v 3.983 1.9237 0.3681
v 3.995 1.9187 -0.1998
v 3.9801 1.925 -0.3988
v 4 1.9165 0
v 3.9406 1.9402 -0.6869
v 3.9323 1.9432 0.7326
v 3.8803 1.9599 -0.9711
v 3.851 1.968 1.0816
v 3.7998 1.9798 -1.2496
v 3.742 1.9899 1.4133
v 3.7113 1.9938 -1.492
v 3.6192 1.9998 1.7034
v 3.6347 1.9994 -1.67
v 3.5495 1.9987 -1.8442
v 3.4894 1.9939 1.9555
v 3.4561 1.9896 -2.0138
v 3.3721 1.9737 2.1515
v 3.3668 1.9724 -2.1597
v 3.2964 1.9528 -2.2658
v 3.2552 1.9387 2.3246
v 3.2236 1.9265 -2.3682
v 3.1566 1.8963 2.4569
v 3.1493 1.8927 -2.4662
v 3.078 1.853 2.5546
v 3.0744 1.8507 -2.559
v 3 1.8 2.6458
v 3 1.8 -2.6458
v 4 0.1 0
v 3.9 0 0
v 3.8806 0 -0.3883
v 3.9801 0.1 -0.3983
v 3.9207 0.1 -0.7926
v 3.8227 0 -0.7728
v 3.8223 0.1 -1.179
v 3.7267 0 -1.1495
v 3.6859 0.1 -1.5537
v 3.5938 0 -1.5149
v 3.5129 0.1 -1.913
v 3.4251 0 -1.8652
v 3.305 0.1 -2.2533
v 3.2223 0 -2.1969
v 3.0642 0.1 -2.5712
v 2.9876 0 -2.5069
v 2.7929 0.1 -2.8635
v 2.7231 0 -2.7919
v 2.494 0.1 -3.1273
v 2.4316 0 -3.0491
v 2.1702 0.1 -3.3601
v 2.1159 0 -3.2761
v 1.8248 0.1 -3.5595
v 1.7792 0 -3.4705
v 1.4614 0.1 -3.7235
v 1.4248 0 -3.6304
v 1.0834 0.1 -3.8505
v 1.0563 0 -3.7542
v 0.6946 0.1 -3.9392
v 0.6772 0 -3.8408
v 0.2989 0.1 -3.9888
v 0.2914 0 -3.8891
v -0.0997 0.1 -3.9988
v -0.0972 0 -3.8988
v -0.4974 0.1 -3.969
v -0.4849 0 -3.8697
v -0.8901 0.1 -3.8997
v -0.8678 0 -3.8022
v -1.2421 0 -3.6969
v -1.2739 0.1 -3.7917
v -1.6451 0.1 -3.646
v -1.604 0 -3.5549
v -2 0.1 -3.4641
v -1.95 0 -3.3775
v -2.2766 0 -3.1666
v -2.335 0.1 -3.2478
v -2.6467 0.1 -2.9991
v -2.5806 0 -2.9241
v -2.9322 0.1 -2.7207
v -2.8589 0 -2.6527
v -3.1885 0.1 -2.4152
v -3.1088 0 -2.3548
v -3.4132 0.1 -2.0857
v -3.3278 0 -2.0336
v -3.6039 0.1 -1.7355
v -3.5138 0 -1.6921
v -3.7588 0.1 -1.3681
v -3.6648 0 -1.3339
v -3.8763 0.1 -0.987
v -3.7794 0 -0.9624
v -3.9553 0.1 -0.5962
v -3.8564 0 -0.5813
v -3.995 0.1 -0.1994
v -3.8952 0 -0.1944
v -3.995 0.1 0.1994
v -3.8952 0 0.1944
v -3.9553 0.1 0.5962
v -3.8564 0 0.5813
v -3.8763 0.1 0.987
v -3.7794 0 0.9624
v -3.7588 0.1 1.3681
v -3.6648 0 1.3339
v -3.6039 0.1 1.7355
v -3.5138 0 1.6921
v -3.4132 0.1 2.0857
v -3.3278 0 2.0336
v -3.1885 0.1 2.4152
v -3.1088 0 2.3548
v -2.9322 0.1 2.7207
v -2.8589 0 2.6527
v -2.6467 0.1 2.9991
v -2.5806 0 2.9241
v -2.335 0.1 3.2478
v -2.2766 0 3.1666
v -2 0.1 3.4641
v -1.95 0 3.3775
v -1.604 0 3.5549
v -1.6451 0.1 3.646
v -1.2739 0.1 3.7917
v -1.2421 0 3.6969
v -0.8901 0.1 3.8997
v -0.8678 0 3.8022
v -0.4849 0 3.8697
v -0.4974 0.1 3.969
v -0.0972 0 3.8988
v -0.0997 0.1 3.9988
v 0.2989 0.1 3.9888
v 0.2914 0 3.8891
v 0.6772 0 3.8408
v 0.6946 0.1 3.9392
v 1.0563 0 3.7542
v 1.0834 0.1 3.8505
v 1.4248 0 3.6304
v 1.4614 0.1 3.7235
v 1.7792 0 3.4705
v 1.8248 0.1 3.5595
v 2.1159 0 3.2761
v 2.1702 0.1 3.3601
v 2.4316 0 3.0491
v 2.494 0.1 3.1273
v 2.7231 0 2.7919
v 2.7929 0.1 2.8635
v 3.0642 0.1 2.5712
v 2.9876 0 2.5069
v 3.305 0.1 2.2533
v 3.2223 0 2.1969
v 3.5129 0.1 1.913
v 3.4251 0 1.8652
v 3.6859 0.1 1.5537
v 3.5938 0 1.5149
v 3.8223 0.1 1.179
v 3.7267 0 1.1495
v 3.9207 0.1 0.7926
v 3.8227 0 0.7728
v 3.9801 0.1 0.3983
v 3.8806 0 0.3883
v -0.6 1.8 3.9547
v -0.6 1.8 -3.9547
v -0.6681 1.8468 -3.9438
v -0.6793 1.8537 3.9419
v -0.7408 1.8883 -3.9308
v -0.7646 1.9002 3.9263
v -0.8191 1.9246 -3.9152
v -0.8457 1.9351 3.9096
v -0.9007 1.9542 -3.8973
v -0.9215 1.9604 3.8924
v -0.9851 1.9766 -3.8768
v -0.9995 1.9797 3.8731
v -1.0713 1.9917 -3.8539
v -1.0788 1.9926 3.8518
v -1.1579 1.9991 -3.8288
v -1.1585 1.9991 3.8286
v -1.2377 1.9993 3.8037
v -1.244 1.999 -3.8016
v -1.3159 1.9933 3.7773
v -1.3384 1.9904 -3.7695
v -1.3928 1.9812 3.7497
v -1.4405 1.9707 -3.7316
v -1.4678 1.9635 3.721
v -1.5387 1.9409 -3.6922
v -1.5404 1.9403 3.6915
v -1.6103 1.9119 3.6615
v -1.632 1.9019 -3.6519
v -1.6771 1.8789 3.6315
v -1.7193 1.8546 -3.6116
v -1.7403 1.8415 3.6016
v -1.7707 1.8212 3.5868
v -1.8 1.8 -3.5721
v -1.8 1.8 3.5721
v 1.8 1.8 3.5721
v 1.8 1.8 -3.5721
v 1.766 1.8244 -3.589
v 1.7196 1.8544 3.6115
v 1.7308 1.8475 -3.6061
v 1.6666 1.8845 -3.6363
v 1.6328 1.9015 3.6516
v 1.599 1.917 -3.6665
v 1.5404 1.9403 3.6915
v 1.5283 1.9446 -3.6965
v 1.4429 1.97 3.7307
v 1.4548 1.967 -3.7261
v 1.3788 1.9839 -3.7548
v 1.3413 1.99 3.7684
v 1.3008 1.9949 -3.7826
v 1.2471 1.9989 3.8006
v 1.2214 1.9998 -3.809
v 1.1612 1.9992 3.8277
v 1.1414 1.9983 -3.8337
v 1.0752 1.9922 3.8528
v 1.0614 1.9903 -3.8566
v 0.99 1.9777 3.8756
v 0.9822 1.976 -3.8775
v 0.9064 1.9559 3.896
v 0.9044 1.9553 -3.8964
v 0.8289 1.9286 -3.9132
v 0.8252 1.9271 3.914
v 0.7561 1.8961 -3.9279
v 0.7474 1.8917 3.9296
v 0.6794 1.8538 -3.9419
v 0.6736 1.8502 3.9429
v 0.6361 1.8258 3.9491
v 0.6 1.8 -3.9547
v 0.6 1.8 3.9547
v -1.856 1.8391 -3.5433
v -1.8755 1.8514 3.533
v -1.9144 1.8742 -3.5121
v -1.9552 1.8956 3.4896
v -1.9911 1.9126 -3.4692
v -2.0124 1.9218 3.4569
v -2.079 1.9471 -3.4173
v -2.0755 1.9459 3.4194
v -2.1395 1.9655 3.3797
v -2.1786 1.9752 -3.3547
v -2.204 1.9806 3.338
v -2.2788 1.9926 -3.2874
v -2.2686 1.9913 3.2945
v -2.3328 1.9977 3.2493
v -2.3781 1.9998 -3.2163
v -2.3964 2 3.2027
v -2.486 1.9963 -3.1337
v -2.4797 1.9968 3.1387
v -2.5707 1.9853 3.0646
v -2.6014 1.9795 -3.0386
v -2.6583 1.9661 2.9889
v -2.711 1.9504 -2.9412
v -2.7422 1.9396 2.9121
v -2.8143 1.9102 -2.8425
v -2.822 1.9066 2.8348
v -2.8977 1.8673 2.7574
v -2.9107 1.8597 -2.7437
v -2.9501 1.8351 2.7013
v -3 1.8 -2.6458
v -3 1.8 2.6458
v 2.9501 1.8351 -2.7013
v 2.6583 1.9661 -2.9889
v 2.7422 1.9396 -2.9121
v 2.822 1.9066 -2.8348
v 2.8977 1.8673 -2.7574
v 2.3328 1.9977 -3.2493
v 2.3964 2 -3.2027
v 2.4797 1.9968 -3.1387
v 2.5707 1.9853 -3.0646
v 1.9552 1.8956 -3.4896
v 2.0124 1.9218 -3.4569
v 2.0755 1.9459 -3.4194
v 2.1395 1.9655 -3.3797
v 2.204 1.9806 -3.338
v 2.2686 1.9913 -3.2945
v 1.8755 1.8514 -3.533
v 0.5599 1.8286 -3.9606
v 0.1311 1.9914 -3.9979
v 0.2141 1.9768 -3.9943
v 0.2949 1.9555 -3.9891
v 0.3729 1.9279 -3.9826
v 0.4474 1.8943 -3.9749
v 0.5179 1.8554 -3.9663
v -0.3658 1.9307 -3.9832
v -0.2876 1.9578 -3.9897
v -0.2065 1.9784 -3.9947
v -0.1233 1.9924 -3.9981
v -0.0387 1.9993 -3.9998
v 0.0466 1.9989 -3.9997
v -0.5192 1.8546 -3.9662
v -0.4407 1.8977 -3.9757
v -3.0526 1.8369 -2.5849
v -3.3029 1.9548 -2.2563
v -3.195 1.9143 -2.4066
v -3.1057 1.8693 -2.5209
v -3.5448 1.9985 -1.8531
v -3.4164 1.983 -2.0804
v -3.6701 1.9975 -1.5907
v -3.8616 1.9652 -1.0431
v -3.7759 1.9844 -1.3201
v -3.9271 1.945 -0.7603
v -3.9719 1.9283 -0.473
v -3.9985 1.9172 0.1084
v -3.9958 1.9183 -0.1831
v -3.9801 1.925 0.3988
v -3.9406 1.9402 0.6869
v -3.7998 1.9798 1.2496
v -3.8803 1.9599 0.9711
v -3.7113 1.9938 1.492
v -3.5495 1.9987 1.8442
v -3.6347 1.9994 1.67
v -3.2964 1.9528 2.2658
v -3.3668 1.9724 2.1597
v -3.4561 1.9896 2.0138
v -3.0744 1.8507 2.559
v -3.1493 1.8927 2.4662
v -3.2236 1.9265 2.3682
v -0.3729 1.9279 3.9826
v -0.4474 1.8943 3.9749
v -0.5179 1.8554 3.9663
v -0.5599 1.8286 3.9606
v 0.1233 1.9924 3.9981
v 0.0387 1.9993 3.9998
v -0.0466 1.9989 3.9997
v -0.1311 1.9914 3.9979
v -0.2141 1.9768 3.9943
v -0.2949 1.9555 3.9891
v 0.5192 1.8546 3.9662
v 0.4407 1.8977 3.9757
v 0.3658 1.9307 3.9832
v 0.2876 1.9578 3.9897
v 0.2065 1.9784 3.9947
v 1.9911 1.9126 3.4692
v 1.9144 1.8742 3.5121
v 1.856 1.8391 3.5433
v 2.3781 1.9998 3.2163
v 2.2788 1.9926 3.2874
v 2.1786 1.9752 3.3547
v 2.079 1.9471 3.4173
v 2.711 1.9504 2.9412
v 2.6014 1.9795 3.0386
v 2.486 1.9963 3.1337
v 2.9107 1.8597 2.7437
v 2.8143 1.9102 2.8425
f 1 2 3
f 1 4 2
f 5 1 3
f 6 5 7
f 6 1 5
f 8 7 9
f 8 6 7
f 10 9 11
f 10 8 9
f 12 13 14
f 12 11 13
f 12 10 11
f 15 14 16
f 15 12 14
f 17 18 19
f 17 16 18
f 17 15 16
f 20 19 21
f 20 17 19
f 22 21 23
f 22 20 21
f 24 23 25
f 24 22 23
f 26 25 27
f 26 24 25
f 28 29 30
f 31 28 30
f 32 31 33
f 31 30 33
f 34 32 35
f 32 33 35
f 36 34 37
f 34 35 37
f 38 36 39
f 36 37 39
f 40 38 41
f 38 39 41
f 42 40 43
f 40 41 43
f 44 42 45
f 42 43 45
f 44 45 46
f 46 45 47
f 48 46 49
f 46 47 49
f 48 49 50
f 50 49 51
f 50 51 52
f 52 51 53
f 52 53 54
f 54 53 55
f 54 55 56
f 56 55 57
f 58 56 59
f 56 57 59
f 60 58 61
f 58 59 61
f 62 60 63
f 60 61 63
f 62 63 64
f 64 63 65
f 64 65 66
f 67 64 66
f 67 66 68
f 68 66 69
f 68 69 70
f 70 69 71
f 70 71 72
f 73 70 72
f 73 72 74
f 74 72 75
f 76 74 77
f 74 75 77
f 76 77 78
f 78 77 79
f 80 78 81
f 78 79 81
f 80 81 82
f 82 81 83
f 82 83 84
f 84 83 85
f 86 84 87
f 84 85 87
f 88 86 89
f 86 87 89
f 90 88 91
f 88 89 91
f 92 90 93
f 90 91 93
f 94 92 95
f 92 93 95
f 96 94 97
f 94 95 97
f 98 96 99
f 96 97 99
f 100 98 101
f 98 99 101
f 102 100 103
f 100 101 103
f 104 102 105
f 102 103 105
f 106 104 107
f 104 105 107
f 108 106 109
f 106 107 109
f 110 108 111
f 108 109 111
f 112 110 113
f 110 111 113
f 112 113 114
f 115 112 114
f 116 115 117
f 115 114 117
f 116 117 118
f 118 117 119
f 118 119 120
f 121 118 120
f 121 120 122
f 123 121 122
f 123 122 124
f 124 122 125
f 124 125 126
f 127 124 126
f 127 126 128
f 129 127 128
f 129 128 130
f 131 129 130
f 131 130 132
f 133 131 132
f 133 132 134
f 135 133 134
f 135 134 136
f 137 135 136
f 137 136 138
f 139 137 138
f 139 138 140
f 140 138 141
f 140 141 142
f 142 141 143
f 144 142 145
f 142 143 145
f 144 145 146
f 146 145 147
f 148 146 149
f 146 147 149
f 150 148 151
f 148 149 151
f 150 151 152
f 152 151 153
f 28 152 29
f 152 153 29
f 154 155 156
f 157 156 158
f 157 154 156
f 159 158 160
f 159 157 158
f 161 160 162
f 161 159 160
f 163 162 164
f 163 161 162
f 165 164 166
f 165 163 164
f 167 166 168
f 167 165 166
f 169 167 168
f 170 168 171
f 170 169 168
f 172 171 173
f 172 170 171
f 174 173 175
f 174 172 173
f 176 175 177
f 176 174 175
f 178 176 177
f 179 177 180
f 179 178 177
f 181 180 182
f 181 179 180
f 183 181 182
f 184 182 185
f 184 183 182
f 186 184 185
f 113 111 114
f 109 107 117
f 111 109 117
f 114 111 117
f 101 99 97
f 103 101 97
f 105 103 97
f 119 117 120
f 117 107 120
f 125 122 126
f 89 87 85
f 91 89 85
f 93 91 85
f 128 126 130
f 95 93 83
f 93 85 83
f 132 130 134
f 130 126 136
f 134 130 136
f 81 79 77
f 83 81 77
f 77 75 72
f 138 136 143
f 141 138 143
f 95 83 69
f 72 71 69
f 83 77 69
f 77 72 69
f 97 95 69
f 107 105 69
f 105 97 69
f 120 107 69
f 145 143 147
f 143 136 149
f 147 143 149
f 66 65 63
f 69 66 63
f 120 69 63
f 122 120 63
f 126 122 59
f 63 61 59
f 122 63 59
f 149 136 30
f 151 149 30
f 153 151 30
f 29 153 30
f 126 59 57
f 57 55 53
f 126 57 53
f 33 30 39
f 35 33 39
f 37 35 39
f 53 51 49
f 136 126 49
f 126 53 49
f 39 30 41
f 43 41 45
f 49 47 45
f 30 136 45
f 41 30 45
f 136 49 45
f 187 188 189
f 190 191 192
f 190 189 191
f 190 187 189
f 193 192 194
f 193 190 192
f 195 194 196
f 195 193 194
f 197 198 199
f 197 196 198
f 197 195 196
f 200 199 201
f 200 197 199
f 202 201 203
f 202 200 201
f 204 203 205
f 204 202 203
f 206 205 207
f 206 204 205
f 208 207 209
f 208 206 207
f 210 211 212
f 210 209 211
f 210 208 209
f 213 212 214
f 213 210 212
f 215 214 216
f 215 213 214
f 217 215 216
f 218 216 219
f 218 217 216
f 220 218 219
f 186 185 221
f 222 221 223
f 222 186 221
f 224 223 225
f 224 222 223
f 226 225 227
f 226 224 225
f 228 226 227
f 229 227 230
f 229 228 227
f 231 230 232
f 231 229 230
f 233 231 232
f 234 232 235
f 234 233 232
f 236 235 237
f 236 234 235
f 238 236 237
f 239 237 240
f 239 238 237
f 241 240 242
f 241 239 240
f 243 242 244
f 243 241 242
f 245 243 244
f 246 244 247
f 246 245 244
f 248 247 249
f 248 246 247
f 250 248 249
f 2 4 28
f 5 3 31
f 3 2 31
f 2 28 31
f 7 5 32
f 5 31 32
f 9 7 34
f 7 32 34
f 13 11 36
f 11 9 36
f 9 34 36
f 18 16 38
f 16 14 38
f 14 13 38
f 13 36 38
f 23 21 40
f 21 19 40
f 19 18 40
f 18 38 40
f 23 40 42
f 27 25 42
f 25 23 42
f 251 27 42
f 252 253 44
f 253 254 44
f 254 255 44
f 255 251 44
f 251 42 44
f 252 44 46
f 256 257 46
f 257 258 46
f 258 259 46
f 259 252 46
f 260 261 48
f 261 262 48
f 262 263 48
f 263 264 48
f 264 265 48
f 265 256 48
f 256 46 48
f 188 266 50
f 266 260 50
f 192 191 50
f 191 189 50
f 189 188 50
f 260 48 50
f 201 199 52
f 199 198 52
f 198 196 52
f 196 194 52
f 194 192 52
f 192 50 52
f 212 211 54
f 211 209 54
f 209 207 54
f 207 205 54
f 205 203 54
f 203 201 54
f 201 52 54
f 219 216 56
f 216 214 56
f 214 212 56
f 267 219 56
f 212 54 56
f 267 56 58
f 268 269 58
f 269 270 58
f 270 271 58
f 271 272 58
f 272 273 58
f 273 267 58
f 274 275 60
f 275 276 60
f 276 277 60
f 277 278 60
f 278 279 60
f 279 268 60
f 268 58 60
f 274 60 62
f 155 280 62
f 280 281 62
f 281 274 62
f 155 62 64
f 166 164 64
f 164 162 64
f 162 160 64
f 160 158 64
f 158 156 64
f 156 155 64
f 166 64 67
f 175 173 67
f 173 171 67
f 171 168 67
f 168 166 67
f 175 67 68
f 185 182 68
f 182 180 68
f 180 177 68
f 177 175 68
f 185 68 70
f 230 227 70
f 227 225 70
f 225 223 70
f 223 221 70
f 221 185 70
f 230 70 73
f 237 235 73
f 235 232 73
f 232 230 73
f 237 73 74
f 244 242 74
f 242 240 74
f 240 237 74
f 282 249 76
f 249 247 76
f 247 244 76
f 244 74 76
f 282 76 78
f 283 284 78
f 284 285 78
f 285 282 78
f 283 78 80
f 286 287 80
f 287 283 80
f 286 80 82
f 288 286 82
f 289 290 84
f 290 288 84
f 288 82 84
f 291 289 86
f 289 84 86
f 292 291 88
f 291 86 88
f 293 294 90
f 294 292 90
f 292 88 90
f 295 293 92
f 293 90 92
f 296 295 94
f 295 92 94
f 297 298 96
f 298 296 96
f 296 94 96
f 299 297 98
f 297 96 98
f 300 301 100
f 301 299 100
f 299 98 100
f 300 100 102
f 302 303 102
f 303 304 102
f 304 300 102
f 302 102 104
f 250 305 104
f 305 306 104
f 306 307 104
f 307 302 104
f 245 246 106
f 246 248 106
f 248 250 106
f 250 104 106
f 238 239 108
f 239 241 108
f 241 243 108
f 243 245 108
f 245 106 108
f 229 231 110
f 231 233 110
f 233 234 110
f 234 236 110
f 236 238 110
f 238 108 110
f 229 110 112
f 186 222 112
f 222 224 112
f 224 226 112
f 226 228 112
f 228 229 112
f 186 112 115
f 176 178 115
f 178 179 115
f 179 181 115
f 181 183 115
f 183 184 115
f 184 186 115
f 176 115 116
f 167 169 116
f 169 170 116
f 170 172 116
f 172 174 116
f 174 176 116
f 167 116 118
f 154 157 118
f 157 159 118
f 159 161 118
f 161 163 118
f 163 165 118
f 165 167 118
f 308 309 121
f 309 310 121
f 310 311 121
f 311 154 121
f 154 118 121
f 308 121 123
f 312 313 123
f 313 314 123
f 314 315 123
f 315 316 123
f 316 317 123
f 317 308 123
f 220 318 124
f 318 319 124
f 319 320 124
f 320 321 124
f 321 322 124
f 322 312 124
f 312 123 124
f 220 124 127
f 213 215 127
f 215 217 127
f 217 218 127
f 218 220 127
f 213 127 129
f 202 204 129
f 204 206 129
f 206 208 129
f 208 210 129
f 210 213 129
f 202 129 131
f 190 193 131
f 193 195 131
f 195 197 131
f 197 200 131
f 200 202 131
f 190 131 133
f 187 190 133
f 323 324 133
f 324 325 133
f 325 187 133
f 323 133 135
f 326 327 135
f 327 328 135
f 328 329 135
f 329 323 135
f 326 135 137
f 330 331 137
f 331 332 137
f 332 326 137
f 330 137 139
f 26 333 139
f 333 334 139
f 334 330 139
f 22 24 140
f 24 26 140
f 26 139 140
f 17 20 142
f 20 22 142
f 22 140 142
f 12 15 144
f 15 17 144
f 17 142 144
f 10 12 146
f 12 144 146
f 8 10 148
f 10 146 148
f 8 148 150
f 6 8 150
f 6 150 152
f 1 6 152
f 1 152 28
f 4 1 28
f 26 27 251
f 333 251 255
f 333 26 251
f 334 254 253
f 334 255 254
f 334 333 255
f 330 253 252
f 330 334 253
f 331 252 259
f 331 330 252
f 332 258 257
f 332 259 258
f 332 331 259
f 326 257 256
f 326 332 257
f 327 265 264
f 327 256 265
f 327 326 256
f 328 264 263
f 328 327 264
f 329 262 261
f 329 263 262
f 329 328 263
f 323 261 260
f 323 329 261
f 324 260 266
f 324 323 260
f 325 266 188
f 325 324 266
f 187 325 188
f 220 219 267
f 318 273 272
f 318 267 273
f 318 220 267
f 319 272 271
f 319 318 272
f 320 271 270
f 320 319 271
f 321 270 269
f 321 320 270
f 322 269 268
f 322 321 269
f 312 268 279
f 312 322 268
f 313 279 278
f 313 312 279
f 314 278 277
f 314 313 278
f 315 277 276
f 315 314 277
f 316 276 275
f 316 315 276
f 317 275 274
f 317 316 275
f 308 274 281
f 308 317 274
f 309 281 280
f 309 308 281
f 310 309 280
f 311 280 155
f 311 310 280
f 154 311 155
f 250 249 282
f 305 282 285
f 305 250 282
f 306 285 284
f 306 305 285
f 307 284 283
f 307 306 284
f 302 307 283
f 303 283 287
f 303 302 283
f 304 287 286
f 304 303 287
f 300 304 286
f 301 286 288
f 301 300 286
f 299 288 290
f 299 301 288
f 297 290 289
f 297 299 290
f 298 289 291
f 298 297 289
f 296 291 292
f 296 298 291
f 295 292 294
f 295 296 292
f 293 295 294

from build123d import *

# Parameters (mm, degrees)
SKETCH_1_R          = 4
EXTRUDE_1_DEPTH     = 2
CUT_EXTRUDE_1_DEPTH = 4
CHAMFER_1_SIZE      = 0.1


with BuildPart() as part:
    # 草图1 → 凸台-拉伸1 (new body)
    with BuildSketch(Plane(origin=(0, 0, 0), x_dir=(1, 0, 0), z_dir=(0, 1, 0))):
        Circle(SKETCH_1_R)
    extrude(amount=EXTRUDE_1_DEPTH)

    # 草图2 → 切除-拉伸1 (cut, symmetric)
    with BuildSketch(Plane.XY):
        with BuildLine():
            Line((-4.460903823, 1.508767734), (-4.68289812, 3.453905247))
            Line((-4.68289812, 3.453905247), (4.900344987, 2.697866633))
            Line((4.900344987, 2.697866633), (4.2, 1.8))
            ThreePointArc((4.2, 1.8), (3.6, 2), (3, 1.8))
            ThreePointArc((3, 1.8), (2.4, 2), (1.8, 1.8))
            ThreePointArc((1.8, 1.8), (1.2, 2), (0.6, 1.8))
            ThreePointArc((0.6, 1.8), (0, 2), (-0.6, 1.8))
            ThreePointArc((-0.6, 1.8), (-1.2, 2), (-1.8, 1.8))
            ThreePointArc((-1.8, 1.8), (-2.4, 2), (-3, 1.8))
            ThreePointArc((-3, 1.8), (-3.79550386, 1.980702932), (-4.460903823, 1.508767734))
        make_face()
    extrude(amount=CUT_EXTRUDE_1_DEPTH, both=True, mode=Mode.SUBTRACT)

    # 倒角1
    chamfer_1_edges = [part.edges().sort_by_distance(p)[0] for p in [
        (-4, 0, 0),
    ]]
    chamfer(chamfer_1_edges, length=CHAMFER_1_SIZE)


solid = part.part
